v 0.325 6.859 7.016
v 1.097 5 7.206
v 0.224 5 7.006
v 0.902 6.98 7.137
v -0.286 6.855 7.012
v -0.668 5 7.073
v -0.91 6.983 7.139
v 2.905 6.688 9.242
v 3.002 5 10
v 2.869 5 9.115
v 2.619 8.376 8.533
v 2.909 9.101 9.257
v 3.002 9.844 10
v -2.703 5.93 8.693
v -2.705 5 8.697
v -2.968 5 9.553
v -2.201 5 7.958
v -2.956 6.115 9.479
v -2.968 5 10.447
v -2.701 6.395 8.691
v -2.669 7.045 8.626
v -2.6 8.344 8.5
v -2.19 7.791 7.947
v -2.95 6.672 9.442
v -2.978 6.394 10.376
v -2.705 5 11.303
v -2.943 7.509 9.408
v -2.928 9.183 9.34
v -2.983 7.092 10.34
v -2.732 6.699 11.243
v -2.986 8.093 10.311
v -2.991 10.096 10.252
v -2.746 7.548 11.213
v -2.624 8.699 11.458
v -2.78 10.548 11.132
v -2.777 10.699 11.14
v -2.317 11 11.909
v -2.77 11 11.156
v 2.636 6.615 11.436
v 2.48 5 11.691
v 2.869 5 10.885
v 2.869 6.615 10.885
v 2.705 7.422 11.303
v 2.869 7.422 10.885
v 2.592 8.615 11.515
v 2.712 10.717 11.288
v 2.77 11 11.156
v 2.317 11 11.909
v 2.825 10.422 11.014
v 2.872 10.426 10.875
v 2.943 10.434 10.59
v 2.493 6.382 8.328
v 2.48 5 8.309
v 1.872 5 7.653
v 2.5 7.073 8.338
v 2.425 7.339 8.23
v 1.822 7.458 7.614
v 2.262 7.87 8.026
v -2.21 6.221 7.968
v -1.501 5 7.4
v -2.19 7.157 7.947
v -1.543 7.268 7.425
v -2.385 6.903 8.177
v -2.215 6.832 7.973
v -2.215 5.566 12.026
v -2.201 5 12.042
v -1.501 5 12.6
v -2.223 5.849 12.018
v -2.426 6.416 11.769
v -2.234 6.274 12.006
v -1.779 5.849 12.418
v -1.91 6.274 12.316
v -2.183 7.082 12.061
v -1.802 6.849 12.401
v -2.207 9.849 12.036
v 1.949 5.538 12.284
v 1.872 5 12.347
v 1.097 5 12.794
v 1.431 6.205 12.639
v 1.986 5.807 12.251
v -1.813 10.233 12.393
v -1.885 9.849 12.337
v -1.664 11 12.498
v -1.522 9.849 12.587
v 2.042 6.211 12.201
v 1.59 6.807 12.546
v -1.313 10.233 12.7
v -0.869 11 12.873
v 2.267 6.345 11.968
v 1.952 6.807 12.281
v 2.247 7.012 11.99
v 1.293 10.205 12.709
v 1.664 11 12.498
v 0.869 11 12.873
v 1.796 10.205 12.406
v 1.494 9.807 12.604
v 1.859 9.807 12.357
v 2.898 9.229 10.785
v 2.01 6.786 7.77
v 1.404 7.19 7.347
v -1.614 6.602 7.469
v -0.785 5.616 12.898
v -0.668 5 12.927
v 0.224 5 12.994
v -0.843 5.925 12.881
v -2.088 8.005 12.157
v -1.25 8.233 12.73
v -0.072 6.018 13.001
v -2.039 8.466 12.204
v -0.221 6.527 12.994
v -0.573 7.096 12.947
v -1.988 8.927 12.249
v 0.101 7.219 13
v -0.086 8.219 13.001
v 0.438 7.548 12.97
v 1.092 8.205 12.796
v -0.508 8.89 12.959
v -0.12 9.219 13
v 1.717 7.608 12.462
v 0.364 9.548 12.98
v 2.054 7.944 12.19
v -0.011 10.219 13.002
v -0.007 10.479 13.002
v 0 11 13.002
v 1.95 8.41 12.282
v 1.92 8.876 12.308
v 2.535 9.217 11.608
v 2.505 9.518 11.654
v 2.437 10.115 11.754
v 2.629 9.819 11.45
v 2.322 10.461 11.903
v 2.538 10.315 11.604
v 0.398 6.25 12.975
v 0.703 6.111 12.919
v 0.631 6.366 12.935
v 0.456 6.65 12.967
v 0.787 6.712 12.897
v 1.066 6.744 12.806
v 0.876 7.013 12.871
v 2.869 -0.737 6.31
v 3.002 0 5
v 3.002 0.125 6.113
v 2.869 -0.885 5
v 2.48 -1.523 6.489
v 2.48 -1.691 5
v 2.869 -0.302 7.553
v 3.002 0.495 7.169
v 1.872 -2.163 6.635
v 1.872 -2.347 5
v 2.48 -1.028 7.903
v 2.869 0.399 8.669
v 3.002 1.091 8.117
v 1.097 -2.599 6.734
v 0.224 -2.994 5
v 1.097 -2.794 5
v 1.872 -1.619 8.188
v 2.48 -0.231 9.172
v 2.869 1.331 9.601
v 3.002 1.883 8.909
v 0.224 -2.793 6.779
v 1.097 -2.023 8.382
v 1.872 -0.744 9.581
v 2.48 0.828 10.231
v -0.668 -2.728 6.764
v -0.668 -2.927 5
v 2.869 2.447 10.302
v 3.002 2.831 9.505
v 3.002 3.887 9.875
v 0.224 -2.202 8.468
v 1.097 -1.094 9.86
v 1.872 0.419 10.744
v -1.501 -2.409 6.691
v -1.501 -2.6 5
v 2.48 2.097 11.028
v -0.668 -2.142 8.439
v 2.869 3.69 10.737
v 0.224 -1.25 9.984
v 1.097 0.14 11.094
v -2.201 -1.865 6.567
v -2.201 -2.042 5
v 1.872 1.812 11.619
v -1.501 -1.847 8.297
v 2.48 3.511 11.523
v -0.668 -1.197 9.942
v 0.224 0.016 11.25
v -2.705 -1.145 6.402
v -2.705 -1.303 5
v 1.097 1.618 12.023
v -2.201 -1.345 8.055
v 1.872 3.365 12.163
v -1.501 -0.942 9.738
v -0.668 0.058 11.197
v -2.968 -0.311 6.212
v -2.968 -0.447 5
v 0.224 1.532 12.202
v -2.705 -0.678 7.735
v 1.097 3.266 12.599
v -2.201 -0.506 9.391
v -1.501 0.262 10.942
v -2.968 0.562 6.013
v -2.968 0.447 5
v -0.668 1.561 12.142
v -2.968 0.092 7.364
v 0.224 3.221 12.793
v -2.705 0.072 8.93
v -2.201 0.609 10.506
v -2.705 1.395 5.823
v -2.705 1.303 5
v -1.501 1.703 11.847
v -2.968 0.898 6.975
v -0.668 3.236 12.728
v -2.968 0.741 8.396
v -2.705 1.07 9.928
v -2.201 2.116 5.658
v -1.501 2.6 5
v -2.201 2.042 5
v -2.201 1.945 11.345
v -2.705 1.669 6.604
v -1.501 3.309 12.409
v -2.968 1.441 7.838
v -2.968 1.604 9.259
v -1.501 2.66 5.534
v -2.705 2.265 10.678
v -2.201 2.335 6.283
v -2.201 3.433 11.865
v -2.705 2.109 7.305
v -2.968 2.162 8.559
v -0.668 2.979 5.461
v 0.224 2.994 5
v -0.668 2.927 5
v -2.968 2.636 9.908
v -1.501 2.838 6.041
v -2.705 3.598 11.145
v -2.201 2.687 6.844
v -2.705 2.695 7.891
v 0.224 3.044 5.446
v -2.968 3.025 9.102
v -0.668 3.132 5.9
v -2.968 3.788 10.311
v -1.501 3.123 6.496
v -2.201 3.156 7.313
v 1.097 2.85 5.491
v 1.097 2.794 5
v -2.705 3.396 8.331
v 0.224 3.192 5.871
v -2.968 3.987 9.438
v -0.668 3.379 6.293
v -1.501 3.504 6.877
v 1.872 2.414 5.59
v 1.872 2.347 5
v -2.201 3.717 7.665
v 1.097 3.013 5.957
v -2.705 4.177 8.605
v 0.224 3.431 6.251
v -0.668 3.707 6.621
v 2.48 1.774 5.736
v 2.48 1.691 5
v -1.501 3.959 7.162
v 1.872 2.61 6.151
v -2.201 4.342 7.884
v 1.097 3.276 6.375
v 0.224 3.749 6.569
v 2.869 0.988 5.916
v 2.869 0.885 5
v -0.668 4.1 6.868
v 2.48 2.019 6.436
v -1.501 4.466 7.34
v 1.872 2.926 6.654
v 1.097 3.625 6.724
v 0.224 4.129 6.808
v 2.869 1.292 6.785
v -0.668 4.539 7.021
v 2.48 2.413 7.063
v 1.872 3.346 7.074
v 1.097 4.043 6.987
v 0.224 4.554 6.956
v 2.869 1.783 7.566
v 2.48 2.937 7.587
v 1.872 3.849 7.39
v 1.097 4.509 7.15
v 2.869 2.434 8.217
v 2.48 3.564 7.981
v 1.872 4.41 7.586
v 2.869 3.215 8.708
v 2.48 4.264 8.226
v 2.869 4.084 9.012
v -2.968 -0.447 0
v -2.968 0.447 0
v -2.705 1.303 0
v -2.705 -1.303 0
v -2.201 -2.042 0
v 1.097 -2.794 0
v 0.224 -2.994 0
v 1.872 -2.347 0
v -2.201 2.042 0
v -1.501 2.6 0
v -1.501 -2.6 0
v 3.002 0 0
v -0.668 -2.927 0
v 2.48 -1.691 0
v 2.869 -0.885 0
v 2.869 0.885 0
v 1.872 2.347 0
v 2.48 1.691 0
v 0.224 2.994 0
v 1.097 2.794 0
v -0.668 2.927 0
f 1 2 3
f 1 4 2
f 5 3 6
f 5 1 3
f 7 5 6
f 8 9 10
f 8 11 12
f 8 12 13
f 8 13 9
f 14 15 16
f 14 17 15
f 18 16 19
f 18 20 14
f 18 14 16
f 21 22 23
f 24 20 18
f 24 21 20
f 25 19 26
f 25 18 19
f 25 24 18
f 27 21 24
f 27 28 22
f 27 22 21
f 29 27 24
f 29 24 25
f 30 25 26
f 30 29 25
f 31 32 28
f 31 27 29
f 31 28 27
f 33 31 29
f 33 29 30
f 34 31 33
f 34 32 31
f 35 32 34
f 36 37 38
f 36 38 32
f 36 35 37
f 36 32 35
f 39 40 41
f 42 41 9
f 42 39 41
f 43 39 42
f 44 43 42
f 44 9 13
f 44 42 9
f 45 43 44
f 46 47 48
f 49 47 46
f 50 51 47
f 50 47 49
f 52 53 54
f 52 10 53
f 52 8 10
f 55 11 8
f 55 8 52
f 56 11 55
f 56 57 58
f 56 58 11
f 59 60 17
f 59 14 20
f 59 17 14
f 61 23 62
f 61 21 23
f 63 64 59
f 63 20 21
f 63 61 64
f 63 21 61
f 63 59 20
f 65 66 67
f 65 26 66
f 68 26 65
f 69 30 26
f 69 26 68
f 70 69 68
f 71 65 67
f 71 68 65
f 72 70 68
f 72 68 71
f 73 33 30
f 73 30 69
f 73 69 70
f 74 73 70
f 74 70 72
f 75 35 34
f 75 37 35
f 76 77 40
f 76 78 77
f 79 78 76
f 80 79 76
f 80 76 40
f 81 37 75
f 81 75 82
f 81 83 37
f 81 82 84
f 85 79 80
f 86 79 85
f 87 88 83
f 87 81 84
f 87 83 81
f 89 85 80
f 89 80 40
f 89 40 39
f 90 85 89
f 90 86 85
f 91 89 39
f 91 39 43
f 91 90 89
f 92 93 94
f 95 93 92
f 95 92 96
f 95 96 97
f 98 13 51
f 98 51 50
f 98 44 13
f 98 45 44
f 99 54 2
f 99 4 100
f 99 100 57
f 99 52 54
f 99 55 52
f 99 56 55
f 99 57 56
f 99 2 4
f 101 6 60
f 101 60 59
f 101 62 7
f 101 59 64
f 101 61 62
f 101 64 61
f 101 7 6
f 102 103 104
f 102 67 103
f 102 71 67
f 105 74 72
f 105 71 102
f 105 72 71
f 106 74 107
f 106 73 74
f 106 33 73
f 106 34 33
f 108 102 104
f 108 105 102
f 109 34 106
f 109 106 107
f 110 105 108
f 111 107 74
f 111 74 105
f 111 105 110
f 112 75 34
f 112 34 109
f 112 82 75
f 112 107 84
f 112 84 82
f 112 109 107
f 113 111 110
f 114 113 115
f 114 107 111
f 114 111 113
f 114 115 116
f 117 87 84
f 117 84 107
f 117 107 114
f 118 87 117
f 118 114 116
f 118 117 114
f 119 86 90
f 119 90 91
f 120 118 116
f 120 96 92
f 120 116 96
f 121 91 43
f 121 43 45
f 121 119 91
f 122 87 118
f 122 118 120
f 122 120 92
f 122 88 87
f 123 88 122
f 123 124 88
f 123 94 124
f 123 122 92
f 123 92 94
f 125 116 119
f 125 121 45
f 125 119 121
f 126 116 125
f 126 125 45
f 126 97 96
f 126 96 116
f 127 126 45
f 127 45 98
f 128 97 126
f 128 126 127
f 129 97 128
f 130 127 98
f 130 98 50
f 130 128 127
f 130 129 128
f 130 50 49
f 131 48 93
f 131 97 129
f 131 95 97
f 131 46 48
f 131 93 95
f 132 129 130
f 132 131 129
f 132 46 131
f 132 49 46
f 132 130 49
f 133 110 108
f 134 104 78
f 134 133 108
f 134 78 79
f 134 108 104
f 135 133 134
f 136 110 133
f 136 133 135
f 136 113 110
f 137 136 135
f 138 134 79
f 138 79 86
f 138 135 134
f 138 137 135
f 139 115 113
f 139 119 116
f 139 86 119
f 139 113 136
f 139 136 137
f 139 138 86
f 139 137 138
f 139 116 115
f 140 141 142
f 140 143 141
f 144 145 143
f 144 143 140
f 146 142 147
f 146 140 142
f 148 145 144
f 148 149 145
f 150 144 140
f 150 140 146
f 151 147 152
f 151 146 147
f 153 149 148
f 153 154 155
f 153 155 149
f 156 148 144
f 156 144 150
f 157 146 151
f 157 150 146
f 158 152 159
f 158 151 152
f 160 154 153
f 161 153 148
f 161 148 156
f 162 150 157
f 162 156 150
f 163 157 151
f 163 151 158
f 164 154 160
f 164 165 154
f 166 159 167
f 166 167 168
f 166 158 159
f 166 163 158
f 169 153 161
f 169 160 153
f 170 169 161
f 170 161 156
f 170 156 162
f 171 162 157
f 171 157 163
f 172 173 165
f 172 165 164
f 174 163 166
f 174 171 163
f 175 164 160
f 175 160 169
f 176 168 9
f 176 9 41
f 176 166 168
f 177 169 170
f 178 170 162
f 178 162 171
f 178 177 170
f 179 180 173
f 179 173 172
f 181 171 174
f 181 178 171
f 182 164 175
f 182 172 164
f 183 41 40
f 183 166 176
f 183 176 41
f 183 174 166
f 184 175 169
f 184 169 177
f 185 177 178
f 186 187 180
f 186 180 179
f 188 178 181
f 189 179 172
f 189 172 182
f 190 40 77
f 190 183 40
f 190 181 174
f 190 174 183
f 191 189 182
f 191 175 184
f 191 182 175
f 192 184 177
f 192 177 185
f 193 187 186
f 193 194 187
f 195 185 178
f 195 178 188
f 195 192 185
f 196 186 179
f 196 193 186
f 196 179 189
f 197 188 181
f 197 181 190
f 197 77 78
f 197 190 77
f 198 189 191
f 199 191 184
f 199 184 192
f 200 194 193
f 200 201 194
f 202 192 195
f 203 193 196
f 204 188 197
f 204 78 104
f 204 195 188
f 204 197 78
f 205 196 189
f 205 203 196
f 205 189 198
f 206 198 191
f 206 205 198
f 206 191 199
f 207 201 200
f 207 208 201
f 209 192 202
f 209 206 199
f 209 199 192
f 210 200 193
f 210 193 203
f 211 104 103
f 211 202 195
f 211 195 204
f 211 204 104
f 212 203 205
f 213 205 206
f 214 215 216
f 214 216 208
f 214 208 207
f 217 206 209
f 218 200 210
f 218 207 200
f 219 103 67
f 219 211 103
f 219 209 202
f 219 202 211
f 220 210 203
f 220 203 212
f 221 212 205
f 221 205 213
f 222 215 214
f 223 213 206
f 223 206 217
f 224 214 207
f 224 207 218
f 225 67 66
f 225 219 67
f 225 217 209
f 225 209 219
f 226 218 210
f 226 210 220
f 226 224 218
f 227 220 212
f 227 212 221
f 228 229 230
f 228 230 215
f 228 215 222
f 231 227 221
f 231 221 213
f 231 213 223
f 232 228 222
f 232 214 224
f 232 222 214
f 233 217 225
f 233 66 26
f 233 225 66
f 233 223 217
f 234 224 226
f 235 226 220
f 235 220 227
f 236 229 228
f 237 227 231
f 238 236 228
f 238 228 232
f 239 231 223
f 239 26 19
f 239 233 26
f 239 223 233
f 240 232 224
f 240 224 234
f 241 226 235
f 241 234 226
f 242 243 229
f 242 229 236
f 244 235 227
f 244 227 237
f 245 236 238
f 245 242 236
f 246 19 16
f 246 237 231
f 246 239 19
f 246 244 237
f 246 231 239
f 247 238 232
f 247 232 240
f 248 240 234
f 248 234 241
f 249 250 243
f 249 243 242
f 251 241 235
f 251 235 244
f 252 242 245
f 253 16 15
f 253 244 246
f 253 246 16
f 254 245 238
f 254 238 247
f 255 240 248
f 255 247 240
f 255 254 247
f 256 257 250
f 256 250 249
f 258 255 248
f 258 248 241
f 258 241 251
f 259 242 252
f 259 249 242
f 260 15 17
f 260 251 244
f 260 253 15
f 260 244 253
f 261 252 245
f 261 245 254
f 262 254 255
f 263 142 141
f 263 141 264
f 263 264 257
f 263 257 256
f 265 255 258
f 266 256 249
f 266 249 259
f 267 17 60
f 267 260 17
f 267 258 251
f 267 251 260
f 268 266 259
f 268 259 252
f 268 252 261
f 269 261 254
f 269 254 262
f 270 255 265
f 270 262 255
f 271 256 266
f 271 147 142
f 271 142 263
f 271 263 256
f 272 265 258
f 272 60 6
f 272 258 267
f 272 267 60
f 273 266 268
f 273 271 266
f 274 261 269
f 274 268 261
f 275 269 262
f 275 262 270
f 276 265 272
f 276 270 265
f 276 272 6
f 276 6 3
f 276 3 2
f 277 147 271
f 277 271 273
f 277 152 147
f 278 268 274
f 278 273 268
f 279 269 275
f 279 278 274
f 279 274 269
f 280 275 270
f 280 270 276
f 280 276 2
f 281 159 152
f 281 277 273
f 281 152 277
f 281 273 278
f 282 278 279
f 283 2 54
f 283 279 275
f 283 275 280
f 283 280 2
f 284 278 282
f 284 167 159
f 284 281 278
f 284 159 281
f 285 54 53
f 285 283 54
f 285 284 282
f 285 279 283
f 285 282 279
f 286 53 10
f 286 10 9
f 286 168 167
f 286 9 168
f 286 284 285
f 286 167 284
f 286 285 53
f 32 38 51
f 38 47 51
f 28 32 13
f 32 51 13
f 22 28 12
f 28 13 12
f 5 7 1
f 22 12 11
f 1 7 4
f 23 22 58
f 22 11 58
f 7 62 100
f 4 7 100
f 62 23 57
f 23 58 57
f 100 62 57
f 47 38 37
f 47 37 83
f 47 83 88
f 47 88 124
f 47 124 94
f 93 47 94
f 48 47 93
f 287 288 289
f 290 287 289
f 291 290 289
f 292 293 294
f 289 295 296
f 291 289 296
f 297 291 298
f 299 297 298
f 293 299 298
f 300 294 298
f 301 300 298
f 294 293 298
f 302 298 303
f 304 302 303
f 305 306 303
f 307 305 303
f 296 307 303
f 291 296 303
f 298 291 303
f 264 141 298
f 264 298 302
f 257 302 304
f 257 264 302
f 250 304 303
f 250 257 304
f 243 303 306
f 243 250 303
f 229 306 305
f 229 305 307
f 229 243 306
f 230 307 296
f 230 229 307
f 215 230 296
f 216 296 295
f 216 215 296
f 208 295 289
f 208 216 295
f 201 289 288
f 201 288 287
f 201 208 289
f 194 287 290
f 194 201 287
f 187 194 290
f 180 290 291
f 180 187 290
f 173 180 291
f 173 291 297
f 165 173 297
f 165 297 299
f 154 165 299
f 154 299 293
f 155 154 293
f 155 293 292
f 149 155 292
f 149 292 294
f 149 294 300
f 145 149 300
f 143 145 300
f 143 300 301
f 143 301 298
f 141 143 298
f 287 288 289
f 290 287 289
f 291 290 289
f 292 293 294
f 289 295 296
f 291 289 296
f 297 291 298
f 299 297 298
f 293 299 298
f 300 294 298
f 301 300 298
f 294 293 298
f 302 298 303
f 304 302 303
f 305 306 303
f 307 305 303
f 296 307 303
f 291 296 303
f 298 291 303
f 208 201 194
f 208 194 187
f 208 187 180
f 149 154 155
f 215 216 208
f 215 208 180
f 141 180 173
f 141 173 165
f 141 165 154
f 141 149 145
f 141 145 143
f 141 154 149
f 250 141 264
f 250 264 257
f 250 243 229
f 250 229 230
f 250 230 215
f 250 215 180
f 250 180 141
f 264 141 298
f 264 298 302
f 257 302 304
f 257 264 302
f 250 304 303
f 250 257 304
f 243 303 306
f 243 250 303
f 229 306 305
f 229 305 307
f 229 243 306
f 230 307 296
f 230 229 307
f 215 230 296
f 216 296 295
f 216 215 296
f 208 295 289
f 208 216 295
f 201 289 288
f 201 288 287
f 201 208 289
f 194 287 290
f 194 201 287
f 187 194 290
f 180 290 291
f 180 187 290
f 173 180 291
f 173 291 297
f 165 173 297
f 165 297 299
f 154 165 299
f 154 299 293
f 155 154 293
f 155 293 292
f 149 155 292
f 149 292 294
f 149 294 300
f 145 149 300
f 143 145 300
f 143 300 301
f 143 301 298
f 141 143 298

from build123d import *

# Parameters (mm, degrees)
F1_R     = 3.002
F4_DEPTH = 12.5


with BuildPart() as f2:
    # F2: sweep along a path in F0
    with BuildLine(Plane.YZ) as f2_path:
        Line((0, 0), (0, 5))
        ThreePointArc((0, 5), (1.464466, 8.535534), (5, 10))
        Line((5, 10), (11, 10))
    # F1 (on Top) → F2 (sweep)
    with BuildSketch(Plane.XY):
        Circle(F1_R)
    sweep(path=f2_path.line)

    # F3 (on Right) → F4 (cut, symmetric)
    with BuildSketch(Plane.YZ):
        Polygon((11, 11.156311), (6.841689, 6.998), (11, 6.998), align=None)
    extrude(amount=F4_DEPTH, both=True, mode=Mode.SUBTRACT)


with BuildPart() as f5:
    # F5: sweep along a path in F0
    with BuildLine(Plane.YZ) as f5_path:
        Line((0, 0), (0, 5))
    # F1 (on Top) → F5 (sweep)
    with BuildSketch(Plane.XY):
        Circle(F1_R)
    sweep(path=f5_path.line)


solid = Compound([f2.part, f5.part])
